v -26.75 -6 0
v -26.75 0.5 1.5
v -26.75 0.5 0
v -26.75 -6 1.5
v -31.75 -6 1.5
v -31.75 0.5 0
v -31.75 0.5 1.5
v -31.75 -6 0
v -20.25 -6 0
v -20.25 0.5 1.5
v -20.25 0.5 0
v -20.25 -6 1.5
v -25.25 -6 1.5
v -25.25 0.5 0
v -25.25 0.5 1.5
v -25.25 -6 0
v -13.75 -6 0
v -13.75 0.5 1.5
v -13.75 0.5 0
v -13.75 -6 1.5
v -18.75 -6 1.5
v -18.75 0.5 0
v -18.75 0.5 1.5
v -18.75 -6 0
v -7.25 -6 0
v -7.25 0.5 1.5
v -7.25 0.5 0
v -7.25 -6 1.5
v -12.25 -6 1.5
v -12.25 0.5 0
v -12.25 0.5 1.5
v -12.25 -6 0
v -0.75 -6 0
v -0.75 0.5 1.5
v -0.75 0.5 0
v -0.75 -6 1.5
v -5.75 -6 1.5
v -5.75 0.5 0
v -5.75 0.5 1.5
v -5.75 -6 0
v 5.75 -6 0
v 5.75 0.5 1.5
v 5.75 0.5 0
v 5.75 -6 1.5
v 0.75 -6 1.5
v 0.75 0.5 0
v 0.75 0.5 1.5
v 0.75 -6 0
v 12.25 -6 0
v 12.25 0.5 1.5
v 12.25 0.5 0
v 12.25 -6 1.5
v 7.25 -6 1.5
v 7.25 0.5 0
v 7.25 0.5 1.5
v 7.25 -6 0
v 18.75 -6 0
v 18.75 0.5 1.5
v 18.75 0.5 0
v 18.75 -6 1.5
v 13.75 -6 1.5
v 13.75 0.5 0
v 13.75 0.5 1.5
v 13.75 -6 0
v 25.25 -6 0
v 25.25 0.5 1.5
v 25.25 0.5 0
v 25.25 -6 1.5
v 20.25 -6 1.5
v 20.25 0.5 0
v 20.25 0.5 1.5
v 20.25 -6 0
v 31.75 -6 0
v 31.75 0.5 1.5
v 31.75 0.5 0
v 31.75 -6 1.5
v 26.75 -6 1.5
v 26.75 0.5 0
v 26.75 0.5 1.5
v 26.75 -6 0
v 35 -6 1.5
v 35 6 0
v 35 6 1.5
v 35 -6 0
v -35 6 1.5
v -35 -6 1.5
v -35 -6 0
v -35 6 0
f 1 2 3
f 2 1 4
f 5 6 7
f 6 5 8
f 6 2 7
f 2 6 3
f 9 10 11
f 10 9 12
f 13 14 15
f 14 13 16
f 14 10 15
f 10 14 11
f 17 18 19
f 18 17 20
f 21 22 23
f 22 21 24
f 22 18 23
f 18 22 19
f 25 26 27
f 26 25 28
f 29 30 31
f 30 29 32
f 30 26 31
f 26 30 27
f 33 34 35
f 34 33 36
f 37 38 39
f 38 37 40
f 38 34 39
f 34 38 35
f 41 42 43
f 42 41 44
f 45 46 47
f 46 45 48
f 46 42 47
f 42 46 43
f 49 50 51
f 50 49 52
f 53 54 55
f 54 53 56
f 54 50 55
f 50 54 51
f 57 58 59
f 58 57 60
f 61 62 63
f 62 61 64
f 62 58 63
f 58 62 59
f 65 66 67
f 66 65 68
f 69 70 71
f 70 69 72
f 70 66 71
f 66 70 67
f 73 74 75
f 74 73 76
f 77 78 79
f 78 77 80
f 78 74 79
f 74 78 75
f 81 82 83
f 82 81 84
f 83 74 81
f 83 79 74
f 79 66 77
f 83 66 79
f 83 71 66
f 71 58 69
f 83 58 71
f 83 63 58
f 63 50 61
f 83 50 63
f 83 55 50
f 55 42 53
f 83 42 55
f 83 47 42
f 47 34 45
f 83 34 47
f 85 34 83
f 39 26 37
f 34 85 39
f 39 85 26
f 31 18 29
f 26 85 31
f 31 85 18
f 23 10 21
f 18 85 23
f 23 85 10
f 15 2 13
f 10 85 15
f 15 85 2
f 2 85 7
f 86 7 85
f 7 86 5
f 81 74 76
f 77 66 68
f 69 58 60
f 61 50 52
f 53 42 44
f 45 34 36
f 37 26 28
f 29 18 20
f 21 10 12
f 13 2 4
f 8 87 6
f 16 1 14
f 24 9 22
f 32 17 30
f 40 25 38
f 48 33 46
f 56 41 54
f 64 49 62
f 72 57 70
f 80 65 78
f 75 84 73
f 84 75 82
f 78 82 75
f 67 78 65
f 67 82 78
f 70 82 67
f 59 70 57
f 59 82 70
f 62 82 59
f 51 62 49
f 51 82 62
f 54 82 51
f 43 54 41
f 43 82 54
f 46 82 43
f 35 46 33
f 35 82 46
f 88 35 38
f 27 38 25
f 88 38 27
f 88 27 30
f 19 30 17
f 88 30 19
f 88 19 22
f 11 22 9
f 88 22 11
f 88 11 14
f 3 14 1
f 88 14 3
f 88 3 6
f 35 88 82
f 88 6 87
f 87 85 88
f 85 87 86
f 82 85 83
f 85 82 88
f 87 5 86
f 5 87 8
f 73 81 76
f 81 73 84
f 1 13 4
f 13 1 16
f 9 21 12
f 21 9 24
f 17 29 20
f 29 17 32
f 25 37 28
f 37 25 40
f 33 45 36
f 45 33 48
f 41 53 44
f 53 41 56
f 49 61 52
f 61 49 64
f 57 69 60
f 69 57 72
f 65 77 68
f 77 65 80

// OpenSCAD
// 10-well agarose gel comb, printed lying flat
// Units: mm

plate_t      = 1.5;   // plate thickness (Z)
spine_len    = 70;    // spine length (X)
spine_w      = 12;    // spine width (Y)
teeth_count  = 10;    // number of teeth
teeth_w      = 5;     // tooth width (X)
teeth_l      = 12;    // tooth length (Y)
gap          = 1.5;   // gap between teeth (X)
overcut      = 0.5;   // cutter overshoot past faces

$fn = 64;

pitch = teeth_w + gap;          // centre-to-centre spacing
x0    = -(teeth_count - 1) * pitch / 2;  // first tooth centre

difference() {
    // Spine
    translate([-spine_len / 2, -spine_w / 2, 0])
        cube([spine_len, spine_w, plate_t]);

    // Teeth
    for (i = [0 : teeth_count - 1])
        translate([x0 + i * pitch - teeth_w / 2, -teeth_l, -overcut])
            cube([teeth_w, teeth_l + overcut, plate_t + 2 * overcut]);
}
